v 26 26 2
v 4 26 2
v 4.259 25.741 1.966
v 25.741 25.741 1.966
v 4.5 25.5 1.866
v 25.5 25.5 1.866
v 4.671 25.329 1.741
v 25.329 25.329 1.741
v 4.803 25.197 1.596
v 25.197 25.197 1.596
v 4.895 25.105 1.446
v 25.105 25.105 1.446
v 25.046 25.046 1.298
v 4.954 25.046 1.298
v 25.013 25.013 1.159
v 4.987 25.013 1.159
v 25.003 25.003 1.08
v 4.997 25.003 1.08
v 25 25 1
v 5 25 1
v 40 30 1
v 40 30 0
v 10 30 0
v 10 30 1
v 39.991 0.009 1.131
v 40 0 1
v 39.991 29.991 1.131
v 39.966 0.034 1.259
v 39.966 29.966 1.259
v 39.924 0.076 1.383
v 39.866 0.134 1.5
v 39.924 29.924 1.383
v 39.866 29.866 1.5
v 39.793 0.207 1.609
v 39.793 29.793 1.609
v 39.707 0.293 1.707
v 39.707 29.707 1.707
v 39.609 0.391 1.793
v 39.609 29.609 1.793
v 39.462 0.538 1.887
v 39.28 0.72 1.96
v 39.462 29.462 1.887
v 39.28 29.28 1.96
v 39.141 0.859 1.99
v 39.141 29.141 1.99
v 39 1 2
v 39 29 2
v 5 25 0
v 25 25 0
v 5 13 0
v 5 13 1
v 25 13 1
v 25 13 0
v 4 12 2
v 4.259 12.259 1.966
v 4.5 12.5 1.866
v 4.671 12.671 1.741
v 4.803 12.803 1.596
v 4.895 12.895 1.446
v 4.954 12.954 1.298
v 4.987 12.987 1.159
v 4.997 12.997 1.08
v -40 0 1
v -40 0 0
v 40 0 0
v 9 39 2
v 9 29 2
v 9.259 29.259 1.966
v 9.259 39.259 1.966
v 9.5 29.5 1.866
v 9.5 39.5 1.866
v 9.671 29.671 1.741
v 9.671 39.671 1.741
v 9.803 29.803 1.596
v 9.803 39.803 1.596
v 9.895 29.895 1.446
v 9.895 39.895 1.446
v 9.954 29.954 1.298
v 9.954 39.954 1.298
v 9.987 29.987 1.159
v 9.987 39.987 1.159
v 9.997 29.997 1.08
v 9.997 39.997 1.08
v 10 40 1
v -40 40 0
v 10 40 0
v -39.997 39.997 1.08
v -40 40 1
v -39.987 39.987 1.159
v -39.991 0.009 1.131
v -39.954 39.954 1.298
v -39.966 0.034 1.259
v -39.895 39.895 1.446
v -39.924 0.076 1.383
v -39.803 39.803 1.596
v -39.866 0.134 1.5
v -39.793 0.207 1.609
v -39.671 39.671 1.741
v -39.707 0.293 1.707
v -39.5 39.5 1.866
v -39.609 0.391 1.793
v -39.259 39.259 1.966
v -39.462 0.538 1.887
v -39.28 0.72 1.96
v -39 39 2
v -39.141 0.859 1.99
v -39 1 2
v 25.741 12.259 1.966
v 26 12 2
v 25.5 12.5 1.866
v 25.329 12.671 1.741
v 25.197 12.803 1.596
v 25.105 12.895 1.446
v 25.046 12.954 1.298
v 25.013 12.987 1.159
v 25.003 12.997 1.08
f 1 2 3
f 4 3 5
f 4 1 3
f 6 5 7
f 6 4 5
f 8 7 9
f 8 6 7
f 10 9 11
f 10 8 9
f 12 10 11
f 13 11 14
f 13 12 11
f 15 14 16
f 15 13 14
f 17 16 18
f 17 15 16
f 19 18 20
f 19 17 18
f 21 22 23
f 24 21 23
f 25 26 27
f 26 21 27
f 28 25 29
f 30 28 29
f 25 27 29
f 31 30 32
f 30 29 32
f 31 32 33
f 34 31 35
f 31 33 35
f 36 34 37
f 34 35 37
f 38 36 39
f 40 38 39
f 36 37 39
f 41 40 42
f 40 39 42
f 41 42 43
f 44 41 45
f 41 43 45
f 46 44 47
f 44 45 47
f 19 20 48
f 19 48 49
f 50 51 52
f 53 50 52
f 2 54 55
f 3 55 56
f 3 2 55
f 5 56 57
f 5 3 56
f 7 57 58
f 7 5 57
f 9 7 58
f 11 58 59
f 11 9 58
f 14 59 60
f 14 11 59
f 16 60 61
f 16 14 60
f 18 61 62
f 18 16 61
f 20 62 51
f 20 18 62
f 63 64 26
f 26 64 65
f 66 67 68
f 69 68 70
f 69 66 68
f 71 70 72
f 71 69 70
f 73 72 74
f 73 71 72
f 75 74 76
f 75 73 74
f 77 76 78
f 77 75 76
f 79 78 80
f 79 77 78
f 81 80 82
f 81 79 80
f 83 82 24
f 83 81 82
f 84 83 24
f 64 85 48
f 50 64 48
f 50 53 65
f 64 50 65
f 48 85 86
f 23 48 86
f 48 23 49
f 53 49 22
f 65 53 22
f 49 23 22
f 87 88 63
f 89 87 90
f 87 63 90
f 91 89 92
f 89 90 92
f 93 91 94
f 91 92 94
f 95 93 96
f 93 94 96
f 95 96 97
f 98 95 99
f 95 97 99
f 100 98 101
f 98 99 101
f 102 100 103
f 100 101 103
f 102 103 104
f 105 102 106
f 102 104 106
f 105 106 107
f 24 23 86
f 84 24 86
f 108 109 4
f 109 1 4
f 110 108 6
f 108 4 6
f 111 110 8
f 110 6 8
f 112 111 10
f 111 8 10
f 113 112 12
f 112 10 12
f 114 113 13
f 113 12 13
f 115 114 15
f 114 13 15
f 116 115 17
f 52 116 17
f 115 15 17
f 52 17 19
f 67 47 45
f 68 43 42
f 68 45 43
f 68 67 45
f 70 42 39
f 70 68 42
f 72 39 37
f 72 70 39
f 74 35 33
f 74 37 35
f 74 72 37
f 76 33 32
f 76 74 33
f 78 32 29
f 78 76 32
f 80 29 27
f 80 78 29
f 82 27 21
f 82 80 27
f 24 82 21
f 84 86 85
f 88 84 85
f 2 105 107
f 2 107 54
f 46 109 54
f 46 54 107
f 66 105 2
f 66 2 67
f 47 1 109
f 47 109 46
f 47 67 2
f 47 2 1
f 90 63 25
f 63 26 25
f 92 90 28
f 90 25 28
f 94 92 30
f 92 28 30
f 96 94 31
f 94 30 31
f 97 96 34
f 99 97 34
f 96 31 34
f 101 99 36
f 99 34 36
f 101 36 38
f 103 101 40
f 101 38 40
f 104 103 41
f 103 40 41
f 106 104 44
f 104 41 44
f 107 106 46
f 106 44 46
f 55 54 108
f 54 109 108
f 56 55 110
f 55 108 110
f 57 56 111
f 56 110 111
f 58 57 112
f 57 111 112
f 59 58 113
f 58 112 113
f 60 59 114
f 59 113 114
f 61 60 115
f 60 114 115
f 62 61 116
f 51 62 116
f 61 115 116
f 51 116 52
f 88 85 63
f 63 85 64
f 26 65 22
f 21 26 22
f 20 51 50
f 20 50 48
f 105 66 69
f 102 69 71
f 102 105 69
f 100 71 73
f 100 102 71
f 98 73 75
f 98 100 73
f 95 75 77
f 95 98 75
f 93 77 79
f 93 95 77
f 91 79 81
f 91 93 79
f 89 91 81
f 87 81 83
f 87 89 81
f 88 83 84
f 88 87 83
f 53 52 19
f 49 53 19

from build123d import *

# Parameters (mm, degrees)
F1_DEPTH = 2
F2_W     = 20
F2_H     = 12
F3_DEPTH = 5
F4_R     = 1


with BuildPart() as f1:
    # F0 (on Top) → F1 (new body)
    with BuildSketch(Plane.XY):
        Polygon((-40, 0), (0, 0), (40, 0), (40, 30), (10, 30), (10, 40), (-40, 40), align=None)
    extrude(amount=F1_DEPTH)

    # F2 (on face) → F3 (cut)
    with BuildSketch(Plane.XY.offset(2)):
        with Locations((15, 19)):
            Rectangle(F2_W, F2_H)
    extrude(amount=-F3_DEPTH, mode=Mode.SUBTRACT)

    # F4
    f4_edges = [f1.edges().sort_by_distance(p)[0] for p in [
        (-15, 40, 2),
        (-40, 20, 2),
        (0, 0, 2),
        (40, 15, 2),
        (25, 30, 2),
        (10, 35, 2),
        (15, 25, 2),
        (5, 19, 2),
        (15, 13, 2),
        (25, 19, 2),
    ]]
    fillet(f4_edges, radius=F4_R)


solid = f1.part
